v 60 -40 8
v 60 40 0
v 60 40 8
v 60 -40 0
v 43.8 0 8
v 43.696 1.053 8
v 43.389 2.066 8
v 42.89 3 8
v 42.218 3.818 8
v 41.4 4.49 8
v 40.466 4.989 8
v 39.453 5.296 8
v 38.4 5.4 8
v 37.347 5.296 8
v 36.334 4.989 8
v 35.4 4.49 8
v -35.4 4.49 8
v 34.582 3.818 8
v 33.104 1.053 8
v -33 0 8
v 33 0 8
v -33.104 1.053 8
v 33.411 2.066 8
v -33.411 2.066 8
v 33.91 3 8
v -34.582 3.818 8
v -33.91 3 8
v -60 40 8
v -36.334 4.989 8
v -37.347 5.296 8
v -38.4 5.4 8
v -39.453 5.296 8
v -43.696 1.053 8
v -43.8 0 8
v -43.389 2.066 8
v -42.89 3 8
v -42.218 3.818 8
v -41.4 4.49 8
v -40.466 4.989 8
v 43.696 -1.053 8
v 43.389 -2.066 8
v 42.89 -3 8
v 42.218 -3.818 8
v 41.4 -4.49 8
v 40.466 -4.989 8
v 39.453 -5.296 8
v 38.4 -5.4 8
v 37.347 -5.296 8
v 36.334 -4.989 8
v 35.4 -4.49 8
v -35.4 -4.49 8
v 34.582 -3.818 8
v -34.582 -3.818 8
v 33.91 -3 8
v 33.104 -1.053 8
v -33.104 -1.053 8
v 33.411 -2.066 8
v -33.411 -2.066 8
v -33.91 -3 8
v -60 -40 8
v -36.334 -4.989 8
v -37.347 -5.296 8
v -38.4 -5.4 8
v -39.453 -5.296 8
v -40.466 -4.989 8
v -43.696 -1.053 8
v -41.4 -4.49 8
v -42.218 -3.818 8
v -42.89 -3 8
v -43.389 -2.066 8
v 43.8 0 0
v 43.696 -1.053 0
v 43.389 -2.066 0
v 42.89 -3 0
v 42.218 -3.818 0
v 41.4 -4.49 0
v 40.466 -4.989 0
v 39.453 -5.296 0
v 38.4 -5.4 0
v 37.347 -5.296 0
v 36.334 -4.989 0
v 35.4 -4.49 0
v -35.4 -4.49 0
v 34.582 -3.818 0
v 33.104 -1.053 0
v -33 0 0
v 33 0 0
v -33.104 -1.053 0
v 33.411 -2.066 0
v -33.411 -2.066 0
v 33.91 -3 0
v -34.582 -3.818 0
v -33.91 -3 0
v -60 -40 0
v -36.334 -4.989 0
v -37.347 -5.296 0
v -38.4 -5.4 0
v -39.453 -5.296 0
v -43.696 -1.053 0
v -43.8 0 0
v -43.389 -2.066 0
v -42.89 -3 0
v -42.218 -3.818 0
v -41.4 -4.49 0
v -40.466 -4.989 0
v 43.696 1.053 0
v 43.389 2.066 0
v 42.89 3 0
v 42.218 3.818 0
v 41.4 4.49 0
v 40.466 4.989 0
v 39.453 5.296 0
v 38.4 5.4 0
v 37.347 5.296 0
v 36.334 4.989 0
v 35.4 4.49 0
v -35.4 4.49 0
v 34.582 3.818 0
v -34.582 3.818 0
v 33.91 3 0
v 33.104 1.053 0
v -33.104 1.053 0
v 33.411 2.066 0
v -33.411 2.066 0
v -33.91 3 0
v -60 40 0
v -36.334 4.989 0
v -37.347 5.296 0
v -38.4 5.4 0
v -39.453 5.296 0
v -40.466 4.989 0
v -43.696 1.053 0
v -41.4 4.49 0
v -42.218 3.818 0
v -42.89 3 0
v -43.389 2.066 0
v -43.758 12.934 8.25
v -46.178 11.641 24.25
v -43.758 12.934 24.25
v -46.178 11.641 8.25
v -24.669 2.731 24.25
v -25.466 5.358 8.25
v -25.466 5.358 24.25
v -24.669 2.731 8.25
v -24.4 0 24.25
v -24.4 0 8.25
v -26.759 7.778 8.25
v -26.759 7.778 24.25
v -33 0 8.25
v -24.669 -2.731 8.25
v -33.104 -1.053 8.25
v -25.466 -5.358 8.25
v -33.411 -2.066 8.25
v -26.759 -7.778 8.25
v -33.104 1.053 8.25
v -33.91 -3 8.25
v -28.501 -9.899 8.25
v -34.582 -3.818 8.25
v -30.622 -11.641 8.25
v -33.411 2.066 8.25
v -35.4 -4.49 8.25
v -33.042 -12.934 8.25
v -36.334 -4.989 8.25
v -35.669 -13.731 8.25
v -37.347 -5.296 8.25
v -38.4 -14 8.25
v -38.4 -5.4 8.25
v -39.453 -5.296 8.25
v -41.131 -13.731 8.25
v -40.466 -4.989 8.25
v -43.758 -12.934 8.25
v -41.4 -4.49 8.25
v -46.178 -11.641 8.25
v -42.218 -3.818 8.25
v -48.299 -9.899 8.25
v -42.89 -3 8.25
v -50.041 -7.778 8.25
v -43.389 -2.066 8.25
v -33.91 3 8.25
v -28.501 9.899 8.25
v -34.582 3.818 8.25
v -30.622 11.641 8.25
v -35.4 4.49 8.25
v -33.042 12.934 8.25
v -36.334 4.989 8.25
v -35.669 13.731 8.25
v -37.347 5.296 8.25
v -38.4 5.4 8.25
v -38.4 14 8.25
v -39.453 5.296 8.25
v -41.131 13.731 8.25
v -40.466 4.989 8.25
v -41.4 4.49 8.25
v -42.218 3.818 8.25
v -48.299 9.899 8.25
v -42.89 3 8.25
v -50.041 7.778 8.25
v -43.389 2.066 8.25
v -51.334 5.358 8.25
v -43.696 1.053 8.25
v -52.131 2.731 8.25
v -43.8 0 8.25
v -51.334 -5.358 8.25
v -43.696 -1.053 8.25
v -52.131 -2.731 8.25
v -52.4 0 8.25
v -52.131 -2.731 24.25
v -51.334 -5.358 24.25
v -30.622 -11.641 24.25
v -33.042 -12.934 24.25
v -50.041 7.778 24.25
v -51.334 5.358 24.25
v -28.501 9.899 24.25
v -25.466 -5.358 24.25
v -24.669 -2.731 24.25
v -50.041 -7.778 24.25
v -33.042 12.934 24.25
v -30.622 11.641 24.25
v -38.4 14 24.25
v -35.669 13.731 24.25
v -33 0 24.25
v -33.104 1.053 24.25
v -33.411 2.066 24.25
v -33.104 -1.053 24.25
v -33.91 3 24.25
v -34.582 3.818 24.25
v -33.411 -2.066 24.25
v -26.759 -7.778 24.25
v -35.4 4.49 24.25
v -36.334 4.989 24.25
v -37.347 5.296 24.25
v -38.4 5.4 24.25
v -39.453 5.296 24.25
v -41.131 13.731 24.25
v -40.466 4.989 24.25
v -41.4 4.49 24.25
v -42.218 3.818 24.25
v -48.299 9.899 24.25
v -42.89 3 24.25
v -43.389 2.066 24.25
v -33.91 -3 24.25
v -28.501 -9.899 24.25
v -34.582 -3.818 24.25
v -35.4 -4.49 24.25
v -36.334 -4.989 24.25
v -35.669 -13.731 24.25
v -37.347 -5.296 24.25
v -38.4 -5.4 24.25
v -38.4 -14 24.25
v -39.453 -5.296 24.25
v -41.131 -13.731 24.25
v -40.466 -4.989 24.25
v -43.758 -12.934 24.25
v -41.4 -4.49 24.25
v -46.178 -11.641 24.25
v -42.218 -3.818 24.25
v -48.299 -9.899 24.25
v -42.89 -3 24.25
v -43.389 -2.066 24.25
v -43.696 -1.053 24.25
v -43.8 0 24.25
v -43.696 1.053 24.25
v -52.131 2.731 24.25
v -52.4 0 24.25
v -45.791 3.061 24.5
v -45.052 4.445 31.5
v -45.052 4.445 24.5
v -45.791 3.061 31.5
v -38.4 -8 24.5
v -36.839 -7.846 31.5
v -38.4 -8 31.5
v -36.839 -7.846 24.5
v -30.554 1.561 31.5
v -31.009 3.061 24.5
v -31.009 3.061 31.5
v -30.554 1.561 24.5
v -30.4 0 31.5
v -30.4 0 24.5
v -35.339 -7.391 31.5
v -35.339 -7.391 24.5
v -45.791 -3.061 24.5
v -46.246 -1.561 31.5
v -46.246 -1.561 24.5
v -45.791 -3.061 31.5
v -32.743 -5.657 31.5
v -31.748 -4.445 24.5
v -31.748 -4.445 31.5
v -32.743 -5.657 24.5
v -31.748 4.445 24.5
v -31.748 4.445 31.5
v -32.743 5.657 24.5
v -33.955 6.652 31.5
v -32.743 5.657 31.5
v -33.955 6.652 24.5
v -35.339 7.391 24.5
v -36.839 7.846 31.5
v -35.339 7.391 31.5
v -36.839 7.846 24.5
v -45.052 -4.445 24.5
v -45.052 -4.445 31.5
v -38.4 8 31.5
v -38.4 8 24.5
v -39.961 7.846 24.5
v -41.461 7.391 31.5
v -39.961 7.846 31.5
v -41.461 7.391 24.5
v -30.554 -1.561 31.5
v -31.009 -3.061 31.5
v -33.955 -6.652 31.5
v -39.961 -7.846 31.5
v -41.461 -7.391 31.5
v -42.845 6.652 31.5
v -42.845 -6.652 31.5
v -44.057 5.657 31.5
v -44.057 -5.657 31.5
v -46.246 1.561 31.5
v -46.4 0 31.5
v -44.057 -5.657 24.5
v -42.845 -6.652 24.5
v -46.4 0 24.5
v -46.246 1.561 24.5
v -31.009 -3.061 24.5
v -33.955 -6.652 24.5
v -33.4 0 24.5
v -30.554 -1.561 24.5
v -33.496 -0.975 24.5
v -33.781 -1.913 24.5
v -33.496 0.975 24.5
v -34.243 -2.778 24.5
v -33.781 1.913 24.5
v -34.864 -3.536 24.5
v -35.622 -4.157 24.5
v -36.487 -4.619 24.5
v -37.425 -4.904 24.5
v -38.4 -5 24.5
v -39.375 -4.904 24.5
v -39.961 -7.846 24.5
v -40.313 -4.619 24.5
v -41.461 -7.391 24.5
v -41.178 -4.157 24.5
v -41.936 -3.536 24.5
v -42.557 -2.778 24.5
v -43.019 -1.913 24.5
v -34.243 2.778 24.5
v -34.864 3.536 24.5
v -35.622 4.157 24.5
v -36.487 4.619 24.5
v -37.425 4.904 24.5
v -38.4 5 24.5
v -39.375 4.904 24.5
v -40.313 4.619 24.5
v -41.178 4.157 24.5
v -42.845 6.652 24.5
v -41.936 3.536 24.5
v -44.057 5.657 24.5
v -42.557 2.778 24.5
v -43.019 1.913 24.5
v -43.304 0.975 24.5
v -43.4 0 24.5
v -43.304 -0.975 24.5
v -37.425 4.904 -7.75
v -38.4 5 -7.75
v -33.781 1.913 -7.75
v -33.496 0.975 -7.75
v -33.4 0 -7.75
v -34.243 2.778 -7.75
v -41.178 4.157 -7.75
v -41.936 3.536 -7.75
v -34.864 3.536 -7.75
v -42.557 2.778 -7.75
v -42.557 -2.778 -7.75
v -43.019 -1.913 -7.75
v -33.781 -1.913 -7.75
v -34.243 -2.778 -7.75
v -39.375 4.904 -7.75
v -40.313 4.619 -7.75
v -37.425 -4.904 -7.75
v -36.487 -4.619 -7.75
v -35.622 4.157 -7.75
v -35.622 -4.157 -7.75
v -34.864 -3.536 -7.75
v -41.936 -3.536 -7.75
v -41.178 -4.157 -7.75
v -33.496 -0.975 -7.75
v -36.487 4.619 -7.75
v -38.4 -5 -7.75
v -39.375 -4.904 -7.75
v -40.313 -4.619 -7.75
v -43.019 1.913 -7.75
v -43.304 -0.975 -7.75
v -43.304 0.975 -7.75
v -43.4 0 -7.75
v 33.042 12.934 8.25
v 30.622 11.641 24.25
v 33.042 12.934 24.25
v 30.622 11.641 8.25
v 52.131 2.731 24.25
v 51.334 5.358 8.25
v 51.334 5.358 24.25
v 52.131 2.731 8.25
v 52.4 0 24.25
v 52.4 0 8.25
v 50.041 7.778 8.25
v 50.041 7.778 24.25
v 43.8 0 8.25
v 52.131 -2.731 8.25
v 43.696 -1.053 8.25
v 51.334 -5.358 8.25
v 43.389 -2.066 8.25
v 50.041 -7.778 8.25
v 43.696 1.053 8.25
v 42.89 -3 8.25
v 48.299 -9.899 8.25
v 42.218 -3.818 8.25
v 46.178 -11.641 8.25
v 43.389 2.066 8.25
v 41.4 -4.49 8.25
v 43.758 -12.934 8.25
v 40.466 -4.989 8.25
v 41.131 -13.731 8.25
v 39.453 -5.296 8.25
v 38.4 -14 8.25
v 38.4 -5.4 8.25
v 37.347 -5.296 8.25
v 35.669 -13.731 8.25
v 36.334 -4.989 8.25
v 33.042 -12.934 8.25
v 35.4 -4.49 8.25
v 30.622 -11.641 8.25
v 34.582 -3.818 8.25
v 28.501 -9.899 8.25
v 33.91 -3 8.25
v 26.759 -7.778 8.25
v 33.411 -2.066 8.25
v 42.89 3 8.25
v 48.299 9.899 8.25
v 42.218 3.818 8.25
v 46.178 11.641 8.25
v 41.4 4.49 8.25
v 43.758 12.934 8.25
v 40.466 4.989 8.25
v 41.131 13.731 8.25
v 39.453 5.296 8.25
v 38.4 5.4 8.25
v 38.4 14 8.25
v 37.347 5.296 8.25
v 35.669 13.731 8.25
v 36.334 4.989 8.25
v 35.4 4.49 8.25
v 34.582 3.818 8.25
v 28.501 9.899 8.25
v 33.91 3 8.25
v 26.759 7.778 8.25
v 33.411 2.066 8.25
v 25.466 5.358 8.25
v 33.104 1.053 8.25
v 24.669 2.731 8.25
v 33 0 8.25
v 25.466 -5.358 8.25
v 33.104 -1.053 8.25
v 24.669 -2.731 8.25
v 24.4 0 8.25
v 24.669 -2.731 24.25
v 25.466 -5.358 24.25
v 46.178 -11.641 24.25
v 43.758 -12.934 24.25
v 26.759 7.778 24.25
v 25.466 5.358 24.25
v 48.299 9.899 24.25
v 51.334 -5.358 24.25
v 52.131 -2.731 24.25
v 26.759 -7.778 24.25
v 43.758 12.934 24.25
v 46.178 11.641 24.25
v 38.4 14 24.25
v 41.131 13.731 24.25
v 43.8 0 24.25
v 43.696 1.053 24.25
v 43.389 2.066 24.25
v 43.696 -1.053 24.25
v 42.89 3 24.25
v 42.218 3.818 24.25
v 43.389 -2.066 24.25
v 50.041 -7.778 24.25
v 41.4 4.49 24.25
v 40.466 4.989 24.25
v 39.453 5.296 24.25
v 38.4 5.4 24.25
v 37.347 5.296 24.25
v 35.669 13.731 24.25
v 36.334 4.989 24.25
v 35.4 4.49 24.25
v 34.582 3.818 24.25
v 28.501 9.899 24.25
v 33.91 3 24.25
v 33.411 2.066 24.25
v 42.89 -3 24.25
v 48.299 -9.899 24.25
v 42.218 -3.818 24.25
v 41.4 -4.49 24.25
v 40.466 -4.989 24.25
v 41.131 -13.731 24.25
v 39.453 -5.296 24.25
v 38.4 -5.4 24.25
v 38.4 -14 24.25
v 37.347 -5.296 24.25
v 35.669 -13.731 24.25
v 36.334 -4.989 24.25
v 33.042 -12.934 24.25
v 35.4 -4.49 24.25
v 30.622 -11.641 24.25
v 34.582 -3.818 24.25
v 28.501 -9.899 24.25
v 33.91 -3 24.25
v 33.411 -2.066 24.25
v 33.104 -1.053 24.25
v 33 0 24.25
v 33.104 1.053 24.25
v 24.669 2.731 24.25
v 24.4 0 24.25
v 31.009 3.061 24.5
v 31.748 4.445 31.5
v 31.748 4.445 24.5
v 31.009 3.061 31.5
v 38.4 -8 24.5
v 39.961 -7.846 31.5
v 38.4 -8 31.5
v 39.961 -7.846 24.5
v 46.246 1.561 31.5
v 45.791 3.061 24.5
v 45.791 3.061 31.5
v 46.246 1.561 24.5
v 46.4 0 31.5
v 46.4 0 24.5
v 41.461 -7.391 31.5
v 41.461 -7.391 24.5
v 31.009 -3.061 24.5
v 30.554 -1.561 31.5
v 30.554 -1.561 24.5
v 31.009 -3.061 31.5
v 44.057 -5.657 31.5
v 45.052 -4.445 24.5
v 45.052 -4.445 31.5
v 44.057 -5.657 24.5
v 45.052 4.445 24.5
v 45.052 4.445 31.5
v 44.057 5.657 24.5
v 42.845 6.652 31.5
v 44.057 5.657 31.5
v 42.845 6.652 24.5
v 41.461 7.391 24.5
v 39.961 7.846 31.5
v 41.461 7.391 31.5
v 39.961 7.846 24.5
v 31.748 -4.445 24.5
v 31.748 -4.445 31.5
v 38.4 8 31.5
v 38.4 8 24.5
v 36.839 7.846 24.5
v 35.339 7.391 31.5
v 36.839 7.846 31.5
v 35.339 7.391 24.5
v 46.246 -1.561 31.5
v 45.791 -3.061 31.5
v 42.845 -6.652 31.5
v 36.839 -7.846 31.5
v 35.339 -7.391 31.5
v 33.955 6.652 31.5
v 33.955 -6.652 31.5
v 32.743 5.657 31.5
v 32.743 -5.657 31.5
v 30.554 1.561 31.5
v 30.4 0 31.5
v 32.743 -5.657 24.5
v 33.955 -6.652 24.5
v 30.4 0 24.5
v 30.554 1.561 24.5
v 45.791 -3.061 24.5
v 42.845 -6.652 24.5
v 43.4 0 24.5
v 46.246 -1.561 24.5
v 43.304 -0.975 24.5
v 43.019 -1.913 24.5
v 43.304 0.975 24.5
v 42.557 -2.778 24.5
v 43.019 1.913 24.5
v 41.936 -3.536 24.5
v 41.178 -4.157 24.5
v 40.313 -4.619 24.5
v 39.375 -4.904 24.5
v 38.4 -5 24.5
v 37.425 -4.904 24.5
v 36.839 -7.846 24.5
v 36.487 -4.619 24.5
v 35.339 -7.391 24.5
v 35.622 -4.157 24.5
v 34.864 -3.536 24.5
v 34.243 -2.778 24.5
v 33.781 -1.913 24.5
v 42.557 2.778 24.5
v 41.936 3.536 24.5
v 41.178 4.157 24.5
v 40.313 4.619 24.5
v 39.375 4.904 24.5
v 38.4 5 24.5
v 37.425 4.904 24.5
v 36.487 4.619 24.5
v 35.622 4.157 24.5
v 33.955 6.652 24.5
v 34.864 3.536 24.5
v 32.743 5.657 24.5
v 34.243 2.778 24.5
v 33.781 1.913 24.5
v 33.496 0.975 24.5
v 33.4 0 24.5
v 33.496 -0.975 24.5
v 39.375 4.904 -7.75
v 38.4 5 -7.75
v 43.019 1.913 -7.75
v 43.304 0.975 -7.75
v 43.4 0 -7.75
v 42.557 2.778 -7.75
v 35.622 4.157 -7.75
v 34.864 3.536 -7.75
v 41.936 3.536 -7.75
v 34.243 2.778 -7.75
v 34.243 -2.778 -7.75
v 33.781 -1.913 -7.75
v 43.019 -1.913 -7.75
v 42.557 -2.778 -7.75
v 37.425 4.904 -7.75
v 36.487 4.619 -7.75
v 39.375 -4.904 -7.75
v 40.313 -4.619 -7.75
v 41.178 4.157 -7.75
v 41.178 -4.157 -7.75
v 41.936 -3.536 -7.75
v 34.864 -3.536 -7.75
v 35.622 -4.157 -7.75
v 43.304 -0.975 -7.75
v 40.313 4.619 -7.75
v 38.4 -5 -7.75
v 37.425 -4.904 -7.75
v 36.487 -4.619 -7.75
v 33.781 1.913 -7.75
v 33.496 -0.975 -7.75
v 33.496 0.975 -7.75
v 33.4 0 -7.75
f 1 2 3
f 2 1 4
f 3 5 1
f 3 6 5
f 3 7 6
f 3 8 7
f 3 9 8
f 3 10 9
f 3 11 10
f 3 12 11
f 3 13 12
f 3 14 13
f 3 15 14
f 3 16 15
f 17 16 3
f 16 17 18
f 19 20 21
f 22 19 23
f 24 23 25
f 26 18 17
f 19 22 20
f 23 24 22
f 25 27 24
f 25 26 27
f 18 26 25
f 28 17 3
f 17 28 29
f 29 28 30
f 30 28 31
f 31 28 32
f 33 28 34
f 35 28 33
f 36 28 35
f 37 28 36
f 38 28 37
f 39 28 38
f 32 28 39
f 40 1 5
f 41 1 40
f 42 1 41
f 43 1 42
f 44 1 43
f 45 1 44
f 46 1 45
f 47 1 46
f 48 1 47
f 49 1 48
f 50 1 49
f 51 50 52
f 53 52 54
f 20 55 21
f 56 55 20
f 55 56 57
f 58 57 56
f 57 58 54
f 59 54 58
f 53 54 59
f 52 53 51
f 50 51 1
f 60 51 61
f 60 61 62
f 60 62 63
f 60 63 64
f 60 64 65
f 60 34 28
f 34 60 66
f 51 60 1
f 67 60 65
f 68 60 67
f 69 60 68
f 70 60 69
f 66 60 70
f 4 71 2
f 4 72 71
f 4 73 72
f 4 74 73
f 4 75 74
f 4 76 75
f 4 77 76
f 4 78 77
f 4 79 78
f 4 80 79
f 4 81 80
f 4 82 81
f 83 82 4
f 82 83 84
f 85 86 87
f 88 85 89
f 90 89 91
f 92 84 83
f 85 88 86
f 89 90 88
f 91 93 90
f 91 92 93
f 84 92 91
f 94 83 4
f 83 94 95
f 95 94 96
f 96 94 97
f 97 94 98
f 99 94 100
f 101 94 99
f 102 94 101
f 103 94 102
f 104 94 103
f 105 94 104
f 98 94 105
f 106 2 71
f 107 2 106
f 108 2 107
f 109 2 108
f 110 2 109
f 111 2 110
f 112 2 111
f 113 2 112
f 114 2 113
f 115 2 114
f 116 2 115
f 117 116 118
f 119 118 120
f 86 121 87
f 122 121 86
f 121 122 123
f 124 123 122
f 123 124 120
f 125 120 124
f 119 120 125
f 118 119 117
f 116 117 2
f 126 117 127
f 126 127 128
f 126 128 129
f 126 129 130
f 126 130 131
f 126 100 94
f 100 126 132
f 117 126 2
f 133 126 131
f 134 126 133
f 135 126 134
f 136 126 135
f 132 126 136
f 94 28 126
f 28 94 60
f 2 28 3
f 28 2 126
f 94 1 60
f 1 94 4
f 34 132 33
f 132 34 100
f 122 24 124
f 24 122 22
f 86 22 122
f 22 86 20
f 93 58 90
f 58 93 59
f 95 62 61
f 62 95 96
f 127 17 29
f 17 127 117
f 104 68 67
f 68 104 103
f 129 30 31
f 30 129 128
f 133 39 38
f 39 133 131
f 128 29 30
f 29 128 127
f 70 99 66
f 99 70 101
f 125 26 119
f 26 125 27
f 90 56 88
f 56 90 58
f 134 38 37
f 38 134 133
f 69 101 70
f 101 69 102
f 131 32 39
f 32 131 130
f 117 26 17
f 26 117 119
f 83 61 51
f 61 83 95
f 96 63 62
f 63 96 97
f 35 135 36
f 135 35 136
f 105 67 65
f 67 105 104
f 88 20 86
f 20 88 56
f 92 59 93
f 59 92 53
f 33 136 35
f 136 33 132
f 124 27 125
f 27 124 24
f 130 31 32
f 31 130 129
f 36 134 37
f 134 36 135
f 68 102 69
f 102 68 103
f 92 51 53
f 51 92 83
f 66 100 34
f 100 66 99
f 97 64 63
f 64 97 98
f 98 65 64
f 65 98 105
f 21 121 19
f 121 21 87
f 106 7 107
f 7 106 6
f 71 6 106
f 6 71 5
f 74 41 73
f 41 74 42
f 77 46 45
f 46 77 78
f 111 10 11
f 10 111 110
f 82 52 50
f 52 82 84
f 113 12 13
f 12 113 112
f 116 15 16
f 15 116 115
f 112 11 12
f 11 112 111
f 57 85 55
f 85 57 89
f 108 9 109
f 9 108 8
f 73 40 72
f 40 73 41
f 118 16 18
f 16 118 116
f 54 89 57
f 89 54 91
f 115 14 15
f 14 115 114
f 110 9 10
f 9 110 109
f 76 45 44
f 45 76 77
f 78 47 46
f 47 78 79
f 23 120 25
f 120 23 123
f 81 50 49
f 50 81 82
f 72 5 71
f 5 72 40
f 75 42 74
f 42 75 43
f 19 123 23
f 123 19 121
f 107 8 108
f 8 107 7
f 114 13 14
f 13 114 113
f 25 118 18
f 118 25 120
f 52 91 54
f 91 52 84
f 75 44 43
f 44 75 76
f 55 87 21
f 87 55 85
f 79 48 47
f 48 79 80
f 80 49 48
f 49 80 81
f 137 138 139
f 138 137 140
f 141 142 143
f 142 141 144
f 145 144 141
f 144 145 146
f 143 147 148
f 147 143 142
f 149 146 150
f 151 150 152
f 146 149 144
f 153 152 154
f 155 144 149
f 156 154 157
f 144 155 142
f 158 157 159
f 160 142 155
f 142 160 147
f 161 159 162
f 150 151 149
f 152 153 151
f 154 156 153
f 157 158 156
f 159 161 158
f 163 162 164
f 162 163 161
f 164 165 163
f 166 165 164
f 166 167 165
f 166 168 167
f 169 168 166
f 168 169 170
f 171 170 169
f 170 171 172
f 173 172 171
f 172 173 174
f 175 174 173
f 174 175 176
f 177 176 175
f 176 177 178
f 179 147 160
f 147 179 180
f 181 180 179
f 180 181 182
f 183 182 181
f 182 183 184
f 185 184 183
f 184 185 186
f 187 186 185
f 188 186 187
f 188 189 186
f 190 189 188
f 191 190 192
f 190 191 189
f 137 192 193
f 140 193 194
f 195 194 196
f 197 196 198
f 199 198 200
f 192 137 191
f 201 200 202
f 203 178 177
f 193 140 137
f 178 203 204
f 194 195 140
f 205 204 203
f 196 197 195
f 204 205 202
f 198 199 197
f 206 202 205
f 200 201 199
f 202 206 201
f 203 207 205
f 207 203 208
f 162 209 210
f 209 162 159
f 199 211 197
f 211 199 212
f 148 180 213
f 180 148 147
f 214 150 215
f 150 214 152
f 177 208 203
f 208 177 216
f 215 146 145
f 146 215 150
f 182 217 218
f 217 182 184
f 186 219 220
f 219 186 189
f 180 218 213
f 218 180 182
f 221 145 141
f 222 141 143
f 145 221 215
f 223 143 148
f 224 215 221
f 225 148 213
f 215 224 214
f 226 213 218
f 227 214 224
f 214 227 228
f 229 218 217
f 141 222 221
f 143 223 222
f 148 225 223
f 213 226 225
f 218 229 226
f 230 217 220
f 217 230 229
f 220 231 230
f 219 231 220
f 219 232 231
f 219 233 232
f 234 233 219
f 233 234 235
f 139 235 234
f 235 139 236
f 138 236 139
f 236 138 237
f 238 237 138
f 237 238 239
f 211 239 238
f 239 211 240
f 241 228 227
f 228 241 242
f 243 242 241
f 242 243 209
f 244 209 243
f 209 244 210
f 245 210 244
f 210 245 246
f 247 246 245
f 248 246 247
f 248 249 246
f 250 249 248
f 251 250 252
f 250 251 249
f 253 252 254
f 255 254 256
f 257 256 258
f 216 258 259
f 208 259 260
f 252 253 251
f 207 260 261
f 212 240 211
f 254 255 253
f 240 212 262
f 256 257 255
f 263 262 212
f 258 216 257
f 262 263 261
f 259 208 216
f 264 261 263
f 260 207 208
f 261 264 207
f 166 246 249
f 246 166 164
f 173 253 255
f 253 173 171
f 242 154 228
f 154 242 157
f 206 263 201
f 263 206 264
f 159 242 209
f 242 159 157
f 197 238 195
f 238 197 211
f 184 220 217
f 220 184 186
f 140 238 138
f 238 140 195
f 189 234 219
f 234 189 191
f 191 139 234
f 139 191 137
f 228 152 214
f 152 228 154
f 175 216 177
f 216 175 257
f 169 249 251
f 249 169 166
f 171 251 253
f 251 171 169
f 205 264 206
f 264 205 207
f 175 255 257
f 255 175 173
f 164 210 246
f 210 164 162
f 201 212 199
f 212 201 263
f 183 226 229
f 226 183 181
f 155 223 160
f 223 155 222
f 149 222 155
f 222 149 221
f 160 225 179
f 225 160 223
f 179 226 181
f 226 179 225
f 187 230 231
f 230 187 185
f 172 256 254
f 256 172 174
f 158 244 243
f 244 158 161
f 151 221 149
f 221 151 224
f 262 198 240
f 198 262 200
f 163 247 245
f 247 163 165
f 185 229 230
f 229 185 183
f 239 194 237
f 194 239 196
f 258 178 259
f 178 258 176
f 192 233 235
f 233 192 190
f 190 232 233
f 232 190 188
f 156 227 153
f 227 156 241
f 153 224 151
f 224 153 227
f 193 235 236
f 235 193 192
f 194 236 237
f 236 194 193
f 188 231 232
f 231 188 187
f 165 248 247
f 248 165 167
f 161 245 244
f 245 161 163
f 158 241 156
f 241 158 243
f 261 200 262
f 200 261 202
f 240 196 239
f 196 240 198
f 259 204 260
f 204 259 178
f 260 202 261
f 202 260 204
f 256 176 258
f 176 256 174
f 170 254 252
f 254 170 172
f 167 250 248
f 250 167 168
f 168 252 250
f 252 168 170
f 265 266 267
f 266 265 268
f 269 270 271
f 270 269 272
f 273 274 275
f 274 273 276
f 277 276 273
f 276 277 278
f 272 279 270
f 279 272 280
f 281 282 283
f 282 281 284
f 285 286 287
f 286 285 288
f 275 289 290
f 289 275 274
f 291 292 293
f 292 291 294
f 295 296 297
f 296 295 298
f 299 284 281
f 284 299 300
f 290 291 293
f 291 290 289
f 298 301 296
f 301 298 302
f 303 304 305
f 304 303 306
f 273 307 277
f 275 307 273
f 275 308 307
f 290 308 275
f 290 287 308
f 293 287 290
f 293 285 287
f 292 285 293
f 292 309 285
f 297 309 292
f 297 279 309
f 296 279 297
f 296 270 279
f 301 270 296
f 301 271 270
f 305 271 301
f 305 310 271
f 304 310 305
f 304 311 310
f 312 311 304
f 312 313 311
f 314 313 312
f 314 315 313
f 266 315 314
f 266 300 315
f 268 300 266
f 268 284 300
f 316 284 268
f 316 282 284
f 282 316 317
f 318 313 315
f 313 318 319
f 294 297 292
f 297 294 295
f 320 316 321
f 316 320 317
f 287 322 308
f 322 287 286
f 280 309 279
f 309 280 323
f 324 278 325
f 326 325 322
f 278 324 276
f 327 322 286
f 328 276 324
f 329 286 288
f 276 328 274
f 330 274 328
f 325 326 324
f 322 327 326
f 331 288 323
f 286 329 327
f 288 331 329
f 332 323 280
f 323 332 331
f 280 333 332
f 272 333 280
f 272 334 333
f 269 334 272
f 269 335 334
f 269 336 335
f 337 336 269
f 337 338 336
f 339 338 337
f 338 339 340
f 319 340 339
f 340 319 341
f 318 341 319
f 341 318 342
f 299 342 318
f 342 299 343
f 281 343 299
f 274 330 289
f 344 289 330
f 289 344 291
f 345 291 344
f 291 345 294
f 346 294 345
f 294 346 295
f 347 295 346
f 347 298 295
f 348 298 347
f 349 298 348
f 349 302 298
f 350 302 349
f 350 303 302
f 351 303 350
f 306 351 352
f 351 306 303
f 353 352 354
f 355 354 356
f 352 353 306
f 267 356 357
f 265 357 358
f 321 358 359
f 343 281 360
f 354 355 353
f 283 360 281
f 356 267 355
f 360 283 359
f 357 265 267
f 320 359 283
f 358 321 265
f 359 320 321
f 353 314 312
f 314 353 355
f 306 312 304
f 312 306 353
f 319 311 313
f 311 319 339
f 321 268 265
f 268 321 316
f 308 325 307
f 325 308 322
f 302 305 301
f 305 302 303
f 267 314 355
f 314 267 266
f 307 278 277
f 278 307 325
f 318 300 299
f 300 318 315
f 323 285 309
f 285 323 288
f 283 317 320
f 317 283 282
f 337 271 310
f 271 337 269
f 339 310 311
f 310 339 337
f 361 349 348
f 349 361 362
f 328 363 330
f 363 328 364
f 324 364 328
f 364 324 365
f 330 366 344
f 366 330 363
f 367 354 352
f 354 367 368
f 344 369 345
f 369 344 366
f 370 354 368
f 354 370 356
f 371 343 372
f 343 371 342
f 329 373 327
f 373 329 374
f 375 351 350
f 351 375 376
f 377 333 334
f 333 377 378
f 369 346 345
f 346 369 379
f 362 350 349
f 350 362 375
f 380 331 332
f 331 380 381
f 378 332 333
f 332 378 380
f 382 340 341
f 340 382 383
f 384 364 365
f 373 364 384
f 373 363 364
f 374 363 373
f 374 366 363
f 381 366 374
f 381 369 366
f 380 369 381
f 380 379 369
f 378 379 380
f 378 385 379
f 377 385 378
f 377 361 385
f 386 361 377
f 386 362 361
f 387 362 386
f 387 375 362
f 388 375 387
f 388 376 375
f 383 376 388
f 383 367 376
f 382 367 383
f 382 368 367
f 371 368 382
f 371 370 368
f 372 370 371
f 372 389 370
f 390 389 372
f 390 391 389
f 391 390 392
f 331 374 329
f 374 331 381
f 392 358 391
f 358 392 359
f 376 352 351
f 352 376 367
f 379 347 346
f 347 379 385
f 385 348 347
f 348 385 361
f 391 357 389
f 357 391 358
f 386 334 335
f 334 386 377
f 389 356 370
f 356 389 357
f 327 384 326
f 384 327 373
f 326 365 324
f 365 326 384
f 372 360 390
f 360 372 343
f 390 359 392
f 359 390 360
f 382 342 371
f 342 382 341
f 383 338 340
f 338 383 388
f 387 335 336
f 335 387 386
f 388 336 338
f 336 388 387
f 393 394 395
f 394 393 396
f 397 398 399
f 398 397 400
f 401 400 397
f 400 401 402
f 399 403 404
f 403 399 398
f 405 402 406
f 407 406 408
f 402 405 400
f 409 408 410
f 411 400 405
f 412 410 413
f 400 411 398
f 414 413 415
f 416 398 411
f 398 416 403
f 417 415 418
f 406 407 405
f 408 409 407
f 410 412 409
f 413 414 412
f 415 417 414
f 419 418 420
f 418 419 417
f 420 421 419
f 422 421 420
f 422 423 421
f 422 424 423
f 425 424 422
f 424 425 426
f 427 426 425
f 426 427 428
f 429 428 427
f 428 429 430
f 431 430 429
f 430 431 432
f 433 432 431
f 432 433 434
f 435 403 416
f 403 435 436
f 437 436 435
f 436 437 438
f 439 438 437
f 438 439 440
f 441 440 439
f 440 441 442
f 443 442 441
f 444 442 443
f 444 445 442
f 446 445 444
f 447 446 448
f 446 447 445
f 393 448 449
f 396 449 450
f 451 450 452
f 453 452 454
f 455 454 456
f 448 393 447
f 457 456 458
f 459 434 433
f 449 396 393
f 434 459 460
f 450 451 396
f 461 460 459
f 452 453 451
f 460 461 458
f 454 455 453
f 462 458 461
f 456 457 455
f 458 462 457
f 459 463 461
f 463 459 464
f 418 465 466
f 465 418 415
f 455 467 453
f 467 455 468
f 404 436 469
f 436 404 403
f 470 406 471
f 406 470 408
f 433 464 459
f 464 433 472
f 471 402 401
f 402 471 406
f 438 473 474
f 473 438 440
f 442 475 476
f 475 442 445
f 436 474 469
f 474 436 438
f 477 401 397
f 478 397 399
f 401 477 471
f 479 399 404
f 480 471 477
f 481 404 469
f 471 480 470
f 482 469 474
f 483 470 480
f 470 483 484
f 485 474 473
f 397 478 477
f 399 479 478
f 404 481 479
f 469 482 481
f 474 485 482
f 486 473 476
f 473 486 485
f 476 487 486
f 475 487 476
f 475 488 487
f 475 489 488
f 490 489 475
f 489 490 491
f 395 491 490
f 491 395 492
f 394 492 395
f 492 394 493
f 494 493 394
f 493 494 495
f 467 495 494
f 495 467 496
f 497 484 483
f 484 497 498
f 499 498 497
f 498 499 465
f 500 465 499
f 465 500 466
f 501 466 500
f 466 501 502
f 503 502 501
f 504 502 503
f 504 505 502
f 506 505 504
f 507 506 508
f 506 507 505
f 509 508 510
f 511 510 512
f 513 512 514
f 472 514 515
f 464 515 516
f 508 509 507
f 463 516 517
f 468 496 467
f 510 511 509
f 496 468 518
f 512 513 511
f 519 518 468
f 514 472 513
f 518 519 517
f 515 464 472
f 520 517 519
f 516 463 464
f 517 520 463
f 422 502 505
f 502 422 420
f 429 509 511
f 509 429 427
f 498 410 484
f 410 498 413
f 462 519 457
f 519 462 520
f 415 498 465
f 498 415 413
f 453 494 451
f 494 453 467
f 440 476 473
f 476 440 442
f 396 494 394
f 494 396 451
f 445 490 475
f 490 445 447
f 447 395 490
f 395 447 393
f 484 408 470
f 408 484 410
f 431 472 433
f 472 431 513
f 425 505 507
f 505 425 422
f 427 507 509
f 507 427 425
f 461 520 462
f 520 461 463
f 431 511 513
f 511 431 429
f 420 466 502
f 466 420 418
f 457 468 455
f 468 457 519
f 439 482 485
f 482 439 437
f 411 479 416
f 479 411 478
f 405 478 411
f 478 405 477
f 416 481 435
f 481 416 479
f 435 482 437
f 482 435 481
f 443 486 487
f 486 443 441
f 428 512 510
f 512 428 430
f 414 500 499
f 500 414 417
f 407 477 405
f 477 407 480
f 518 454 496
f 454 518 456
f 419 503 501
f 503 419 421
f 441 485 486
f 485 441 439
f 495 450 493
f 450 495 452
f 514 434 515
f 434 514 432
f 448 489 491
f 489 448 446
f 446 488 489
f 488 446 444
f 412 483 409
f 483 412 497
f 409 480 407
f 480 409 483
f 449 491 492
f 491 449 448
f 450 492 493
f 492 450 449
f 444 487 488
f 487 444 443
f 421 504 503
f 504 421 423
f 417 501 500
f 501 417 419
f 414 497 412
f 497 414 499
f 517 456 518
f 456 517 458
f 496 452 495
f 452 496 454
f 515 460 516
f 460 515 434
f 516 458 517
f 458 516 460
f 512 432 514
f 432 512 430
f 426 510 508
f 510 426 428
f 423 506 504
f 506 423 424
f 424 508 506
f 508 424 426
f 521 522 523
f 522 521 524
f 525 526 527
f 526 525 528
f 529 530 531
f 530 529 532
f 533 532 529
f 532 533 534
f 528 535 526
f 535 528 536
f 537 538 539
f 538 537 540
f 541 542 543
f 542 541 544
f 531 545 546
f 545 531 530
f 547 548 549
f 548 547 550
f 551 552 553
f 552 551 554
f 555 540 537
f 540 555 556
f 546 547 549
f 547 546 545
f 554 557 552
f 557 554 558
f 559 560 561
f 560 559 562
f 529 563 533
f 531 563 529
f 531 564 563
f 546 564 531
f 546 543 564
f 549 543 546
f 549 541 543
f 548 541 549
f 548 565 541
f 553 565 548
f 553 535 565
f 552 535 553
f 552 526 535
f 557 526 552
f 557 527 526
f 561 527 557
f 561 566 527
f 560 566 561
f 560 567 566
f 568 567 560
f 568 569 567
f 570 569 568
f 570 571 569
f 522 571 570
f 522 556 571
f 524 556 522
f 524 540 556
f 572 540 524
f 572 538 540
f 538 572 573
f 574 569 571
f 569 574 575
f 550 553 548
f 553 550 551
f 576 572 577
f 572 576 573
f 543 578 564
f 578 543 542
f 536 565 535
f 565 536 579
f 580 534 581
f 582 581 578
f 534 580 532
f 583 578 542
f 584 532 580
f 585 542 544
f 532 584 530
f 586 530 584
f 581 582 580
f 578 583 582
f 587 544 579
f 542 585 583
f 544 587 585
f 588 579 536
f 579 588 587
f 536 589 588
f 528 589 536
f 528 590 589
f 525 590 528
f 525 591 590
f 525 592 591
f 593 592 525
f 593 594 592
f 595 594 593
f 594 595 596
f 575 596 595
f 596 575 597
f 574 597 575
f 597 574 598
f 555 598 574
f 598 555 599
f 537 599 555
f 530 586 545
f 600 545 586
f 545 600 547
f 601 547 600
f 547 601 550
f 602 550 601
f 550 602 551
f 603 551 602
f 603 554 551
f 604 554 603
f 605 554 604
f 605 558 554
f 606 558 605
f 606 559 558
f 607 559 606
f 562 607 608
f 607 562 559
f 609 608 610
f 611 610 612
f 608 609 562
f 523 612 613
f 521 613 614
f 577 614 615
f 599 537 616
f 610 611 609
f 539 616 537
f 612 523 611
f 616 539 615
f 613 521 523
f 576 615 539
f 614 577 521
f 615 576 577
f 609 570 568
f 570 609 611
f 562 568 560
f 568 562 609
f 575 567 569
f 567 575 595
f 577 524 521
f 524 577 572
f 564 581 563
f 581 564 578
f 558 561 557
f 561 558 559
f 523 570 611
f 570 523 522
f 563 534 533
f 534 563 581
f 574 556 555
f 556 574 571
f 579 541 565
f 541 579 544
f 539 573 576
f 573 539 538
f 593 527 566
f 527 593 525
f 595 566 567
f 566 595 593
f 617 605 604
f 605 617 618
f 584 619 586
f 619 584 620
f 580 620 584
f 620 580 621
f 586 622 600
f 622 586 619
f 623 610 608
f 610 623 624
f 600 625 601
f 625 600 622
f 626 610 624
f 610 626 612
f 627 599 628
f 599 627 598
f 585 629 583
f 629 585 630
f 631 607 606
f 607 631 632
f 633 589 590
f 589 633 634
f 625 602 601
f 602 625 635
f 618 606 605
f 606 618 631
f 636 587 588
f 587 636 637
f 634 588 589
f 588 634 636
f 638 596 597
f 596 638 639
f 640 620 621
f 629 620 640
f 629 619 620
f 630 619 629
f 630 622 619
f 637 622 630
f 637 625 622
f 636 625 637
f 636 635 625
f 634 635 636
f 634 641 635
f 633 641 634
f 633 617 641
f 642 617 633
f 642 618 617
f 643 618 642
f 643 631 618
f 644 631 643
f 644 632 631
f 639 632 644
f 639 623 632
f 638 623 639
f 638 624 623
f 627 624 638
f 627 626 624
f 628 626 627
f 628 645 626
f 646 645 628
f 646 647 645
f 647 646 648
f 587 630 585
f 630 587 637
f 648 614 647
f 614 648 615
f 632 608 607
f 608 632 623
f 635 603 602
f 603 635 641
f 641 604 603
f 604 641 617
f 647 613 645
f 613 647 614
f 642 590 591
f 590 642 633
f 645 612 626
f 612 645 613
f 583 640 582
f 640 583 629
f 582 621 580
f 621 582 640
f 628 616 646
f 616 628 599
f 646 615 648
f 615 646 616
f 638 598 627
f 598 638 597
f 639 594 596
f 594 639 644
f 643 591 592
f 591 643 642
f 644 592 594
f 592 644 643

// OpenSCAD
$fn = 32;

// ------------------------------------------------------------------------
// Standoff columns: 2 d28 standoffs, bolts d10
// Every part is its own module, assembly() places them once.
// ------------------------------------------------------------------------

// --- part 1 ---
module base_plate() {
  difference() {
    translate([-60, -40, 0]) cube([120, 80, 8]);
    translate([-38.4, 0, -1]) cylinder(h = 10, d = 10.8);
    translate([38.4, 0, -1]) cylinder(h = 10, d = 10.8);
  }
}

// --- part 2 ---
module spacer1() {
  difference() {
      translate([0, 0, 0]) cylinder(h = 16, d = 28);
      translate([0, 0, -1]) cylinder(h = 18, d = 10.8);
    }
}

// --- part 3 ---
module bolt1() {
  cylinder(h = 7, d = 16);
  translate([0, 0, -32.25]) cylinder(h = 32.25, d = 10);
}

// --- part 4 ---
module spacer2() {
  difference() {
      translate([0, 0, 0]) cylinder(h = 16, d = 28);
      translate([0, 0, -1]) cylinder(h = 18, d = 10.8);
    }
}

// --- part 5 ---
module bolt2() {
  cylinder(h = 7, d = 16);
  translate([0, 0, -32.25]) cylinder(h = 32.25, d = 10);
}

// --- assembly ---
module assembly() {
  translate([0, 0, 0]) rotate([0, 0, 0]) base_plate();
  translate([-38.4, 0, 8.25]) rotate([0, 0, 0]) spacer1();
  translate([-38.4, 0, 24.5]) rotate([0, 0, 0]) bolt1();
  translate([38.4, 0, 8.25]) rotate([0, 0, 0]) spacer2();
  translate([38.4, 0, 24.5]) rotate([0, 0, 0]) bolt2();
}

assembly();
